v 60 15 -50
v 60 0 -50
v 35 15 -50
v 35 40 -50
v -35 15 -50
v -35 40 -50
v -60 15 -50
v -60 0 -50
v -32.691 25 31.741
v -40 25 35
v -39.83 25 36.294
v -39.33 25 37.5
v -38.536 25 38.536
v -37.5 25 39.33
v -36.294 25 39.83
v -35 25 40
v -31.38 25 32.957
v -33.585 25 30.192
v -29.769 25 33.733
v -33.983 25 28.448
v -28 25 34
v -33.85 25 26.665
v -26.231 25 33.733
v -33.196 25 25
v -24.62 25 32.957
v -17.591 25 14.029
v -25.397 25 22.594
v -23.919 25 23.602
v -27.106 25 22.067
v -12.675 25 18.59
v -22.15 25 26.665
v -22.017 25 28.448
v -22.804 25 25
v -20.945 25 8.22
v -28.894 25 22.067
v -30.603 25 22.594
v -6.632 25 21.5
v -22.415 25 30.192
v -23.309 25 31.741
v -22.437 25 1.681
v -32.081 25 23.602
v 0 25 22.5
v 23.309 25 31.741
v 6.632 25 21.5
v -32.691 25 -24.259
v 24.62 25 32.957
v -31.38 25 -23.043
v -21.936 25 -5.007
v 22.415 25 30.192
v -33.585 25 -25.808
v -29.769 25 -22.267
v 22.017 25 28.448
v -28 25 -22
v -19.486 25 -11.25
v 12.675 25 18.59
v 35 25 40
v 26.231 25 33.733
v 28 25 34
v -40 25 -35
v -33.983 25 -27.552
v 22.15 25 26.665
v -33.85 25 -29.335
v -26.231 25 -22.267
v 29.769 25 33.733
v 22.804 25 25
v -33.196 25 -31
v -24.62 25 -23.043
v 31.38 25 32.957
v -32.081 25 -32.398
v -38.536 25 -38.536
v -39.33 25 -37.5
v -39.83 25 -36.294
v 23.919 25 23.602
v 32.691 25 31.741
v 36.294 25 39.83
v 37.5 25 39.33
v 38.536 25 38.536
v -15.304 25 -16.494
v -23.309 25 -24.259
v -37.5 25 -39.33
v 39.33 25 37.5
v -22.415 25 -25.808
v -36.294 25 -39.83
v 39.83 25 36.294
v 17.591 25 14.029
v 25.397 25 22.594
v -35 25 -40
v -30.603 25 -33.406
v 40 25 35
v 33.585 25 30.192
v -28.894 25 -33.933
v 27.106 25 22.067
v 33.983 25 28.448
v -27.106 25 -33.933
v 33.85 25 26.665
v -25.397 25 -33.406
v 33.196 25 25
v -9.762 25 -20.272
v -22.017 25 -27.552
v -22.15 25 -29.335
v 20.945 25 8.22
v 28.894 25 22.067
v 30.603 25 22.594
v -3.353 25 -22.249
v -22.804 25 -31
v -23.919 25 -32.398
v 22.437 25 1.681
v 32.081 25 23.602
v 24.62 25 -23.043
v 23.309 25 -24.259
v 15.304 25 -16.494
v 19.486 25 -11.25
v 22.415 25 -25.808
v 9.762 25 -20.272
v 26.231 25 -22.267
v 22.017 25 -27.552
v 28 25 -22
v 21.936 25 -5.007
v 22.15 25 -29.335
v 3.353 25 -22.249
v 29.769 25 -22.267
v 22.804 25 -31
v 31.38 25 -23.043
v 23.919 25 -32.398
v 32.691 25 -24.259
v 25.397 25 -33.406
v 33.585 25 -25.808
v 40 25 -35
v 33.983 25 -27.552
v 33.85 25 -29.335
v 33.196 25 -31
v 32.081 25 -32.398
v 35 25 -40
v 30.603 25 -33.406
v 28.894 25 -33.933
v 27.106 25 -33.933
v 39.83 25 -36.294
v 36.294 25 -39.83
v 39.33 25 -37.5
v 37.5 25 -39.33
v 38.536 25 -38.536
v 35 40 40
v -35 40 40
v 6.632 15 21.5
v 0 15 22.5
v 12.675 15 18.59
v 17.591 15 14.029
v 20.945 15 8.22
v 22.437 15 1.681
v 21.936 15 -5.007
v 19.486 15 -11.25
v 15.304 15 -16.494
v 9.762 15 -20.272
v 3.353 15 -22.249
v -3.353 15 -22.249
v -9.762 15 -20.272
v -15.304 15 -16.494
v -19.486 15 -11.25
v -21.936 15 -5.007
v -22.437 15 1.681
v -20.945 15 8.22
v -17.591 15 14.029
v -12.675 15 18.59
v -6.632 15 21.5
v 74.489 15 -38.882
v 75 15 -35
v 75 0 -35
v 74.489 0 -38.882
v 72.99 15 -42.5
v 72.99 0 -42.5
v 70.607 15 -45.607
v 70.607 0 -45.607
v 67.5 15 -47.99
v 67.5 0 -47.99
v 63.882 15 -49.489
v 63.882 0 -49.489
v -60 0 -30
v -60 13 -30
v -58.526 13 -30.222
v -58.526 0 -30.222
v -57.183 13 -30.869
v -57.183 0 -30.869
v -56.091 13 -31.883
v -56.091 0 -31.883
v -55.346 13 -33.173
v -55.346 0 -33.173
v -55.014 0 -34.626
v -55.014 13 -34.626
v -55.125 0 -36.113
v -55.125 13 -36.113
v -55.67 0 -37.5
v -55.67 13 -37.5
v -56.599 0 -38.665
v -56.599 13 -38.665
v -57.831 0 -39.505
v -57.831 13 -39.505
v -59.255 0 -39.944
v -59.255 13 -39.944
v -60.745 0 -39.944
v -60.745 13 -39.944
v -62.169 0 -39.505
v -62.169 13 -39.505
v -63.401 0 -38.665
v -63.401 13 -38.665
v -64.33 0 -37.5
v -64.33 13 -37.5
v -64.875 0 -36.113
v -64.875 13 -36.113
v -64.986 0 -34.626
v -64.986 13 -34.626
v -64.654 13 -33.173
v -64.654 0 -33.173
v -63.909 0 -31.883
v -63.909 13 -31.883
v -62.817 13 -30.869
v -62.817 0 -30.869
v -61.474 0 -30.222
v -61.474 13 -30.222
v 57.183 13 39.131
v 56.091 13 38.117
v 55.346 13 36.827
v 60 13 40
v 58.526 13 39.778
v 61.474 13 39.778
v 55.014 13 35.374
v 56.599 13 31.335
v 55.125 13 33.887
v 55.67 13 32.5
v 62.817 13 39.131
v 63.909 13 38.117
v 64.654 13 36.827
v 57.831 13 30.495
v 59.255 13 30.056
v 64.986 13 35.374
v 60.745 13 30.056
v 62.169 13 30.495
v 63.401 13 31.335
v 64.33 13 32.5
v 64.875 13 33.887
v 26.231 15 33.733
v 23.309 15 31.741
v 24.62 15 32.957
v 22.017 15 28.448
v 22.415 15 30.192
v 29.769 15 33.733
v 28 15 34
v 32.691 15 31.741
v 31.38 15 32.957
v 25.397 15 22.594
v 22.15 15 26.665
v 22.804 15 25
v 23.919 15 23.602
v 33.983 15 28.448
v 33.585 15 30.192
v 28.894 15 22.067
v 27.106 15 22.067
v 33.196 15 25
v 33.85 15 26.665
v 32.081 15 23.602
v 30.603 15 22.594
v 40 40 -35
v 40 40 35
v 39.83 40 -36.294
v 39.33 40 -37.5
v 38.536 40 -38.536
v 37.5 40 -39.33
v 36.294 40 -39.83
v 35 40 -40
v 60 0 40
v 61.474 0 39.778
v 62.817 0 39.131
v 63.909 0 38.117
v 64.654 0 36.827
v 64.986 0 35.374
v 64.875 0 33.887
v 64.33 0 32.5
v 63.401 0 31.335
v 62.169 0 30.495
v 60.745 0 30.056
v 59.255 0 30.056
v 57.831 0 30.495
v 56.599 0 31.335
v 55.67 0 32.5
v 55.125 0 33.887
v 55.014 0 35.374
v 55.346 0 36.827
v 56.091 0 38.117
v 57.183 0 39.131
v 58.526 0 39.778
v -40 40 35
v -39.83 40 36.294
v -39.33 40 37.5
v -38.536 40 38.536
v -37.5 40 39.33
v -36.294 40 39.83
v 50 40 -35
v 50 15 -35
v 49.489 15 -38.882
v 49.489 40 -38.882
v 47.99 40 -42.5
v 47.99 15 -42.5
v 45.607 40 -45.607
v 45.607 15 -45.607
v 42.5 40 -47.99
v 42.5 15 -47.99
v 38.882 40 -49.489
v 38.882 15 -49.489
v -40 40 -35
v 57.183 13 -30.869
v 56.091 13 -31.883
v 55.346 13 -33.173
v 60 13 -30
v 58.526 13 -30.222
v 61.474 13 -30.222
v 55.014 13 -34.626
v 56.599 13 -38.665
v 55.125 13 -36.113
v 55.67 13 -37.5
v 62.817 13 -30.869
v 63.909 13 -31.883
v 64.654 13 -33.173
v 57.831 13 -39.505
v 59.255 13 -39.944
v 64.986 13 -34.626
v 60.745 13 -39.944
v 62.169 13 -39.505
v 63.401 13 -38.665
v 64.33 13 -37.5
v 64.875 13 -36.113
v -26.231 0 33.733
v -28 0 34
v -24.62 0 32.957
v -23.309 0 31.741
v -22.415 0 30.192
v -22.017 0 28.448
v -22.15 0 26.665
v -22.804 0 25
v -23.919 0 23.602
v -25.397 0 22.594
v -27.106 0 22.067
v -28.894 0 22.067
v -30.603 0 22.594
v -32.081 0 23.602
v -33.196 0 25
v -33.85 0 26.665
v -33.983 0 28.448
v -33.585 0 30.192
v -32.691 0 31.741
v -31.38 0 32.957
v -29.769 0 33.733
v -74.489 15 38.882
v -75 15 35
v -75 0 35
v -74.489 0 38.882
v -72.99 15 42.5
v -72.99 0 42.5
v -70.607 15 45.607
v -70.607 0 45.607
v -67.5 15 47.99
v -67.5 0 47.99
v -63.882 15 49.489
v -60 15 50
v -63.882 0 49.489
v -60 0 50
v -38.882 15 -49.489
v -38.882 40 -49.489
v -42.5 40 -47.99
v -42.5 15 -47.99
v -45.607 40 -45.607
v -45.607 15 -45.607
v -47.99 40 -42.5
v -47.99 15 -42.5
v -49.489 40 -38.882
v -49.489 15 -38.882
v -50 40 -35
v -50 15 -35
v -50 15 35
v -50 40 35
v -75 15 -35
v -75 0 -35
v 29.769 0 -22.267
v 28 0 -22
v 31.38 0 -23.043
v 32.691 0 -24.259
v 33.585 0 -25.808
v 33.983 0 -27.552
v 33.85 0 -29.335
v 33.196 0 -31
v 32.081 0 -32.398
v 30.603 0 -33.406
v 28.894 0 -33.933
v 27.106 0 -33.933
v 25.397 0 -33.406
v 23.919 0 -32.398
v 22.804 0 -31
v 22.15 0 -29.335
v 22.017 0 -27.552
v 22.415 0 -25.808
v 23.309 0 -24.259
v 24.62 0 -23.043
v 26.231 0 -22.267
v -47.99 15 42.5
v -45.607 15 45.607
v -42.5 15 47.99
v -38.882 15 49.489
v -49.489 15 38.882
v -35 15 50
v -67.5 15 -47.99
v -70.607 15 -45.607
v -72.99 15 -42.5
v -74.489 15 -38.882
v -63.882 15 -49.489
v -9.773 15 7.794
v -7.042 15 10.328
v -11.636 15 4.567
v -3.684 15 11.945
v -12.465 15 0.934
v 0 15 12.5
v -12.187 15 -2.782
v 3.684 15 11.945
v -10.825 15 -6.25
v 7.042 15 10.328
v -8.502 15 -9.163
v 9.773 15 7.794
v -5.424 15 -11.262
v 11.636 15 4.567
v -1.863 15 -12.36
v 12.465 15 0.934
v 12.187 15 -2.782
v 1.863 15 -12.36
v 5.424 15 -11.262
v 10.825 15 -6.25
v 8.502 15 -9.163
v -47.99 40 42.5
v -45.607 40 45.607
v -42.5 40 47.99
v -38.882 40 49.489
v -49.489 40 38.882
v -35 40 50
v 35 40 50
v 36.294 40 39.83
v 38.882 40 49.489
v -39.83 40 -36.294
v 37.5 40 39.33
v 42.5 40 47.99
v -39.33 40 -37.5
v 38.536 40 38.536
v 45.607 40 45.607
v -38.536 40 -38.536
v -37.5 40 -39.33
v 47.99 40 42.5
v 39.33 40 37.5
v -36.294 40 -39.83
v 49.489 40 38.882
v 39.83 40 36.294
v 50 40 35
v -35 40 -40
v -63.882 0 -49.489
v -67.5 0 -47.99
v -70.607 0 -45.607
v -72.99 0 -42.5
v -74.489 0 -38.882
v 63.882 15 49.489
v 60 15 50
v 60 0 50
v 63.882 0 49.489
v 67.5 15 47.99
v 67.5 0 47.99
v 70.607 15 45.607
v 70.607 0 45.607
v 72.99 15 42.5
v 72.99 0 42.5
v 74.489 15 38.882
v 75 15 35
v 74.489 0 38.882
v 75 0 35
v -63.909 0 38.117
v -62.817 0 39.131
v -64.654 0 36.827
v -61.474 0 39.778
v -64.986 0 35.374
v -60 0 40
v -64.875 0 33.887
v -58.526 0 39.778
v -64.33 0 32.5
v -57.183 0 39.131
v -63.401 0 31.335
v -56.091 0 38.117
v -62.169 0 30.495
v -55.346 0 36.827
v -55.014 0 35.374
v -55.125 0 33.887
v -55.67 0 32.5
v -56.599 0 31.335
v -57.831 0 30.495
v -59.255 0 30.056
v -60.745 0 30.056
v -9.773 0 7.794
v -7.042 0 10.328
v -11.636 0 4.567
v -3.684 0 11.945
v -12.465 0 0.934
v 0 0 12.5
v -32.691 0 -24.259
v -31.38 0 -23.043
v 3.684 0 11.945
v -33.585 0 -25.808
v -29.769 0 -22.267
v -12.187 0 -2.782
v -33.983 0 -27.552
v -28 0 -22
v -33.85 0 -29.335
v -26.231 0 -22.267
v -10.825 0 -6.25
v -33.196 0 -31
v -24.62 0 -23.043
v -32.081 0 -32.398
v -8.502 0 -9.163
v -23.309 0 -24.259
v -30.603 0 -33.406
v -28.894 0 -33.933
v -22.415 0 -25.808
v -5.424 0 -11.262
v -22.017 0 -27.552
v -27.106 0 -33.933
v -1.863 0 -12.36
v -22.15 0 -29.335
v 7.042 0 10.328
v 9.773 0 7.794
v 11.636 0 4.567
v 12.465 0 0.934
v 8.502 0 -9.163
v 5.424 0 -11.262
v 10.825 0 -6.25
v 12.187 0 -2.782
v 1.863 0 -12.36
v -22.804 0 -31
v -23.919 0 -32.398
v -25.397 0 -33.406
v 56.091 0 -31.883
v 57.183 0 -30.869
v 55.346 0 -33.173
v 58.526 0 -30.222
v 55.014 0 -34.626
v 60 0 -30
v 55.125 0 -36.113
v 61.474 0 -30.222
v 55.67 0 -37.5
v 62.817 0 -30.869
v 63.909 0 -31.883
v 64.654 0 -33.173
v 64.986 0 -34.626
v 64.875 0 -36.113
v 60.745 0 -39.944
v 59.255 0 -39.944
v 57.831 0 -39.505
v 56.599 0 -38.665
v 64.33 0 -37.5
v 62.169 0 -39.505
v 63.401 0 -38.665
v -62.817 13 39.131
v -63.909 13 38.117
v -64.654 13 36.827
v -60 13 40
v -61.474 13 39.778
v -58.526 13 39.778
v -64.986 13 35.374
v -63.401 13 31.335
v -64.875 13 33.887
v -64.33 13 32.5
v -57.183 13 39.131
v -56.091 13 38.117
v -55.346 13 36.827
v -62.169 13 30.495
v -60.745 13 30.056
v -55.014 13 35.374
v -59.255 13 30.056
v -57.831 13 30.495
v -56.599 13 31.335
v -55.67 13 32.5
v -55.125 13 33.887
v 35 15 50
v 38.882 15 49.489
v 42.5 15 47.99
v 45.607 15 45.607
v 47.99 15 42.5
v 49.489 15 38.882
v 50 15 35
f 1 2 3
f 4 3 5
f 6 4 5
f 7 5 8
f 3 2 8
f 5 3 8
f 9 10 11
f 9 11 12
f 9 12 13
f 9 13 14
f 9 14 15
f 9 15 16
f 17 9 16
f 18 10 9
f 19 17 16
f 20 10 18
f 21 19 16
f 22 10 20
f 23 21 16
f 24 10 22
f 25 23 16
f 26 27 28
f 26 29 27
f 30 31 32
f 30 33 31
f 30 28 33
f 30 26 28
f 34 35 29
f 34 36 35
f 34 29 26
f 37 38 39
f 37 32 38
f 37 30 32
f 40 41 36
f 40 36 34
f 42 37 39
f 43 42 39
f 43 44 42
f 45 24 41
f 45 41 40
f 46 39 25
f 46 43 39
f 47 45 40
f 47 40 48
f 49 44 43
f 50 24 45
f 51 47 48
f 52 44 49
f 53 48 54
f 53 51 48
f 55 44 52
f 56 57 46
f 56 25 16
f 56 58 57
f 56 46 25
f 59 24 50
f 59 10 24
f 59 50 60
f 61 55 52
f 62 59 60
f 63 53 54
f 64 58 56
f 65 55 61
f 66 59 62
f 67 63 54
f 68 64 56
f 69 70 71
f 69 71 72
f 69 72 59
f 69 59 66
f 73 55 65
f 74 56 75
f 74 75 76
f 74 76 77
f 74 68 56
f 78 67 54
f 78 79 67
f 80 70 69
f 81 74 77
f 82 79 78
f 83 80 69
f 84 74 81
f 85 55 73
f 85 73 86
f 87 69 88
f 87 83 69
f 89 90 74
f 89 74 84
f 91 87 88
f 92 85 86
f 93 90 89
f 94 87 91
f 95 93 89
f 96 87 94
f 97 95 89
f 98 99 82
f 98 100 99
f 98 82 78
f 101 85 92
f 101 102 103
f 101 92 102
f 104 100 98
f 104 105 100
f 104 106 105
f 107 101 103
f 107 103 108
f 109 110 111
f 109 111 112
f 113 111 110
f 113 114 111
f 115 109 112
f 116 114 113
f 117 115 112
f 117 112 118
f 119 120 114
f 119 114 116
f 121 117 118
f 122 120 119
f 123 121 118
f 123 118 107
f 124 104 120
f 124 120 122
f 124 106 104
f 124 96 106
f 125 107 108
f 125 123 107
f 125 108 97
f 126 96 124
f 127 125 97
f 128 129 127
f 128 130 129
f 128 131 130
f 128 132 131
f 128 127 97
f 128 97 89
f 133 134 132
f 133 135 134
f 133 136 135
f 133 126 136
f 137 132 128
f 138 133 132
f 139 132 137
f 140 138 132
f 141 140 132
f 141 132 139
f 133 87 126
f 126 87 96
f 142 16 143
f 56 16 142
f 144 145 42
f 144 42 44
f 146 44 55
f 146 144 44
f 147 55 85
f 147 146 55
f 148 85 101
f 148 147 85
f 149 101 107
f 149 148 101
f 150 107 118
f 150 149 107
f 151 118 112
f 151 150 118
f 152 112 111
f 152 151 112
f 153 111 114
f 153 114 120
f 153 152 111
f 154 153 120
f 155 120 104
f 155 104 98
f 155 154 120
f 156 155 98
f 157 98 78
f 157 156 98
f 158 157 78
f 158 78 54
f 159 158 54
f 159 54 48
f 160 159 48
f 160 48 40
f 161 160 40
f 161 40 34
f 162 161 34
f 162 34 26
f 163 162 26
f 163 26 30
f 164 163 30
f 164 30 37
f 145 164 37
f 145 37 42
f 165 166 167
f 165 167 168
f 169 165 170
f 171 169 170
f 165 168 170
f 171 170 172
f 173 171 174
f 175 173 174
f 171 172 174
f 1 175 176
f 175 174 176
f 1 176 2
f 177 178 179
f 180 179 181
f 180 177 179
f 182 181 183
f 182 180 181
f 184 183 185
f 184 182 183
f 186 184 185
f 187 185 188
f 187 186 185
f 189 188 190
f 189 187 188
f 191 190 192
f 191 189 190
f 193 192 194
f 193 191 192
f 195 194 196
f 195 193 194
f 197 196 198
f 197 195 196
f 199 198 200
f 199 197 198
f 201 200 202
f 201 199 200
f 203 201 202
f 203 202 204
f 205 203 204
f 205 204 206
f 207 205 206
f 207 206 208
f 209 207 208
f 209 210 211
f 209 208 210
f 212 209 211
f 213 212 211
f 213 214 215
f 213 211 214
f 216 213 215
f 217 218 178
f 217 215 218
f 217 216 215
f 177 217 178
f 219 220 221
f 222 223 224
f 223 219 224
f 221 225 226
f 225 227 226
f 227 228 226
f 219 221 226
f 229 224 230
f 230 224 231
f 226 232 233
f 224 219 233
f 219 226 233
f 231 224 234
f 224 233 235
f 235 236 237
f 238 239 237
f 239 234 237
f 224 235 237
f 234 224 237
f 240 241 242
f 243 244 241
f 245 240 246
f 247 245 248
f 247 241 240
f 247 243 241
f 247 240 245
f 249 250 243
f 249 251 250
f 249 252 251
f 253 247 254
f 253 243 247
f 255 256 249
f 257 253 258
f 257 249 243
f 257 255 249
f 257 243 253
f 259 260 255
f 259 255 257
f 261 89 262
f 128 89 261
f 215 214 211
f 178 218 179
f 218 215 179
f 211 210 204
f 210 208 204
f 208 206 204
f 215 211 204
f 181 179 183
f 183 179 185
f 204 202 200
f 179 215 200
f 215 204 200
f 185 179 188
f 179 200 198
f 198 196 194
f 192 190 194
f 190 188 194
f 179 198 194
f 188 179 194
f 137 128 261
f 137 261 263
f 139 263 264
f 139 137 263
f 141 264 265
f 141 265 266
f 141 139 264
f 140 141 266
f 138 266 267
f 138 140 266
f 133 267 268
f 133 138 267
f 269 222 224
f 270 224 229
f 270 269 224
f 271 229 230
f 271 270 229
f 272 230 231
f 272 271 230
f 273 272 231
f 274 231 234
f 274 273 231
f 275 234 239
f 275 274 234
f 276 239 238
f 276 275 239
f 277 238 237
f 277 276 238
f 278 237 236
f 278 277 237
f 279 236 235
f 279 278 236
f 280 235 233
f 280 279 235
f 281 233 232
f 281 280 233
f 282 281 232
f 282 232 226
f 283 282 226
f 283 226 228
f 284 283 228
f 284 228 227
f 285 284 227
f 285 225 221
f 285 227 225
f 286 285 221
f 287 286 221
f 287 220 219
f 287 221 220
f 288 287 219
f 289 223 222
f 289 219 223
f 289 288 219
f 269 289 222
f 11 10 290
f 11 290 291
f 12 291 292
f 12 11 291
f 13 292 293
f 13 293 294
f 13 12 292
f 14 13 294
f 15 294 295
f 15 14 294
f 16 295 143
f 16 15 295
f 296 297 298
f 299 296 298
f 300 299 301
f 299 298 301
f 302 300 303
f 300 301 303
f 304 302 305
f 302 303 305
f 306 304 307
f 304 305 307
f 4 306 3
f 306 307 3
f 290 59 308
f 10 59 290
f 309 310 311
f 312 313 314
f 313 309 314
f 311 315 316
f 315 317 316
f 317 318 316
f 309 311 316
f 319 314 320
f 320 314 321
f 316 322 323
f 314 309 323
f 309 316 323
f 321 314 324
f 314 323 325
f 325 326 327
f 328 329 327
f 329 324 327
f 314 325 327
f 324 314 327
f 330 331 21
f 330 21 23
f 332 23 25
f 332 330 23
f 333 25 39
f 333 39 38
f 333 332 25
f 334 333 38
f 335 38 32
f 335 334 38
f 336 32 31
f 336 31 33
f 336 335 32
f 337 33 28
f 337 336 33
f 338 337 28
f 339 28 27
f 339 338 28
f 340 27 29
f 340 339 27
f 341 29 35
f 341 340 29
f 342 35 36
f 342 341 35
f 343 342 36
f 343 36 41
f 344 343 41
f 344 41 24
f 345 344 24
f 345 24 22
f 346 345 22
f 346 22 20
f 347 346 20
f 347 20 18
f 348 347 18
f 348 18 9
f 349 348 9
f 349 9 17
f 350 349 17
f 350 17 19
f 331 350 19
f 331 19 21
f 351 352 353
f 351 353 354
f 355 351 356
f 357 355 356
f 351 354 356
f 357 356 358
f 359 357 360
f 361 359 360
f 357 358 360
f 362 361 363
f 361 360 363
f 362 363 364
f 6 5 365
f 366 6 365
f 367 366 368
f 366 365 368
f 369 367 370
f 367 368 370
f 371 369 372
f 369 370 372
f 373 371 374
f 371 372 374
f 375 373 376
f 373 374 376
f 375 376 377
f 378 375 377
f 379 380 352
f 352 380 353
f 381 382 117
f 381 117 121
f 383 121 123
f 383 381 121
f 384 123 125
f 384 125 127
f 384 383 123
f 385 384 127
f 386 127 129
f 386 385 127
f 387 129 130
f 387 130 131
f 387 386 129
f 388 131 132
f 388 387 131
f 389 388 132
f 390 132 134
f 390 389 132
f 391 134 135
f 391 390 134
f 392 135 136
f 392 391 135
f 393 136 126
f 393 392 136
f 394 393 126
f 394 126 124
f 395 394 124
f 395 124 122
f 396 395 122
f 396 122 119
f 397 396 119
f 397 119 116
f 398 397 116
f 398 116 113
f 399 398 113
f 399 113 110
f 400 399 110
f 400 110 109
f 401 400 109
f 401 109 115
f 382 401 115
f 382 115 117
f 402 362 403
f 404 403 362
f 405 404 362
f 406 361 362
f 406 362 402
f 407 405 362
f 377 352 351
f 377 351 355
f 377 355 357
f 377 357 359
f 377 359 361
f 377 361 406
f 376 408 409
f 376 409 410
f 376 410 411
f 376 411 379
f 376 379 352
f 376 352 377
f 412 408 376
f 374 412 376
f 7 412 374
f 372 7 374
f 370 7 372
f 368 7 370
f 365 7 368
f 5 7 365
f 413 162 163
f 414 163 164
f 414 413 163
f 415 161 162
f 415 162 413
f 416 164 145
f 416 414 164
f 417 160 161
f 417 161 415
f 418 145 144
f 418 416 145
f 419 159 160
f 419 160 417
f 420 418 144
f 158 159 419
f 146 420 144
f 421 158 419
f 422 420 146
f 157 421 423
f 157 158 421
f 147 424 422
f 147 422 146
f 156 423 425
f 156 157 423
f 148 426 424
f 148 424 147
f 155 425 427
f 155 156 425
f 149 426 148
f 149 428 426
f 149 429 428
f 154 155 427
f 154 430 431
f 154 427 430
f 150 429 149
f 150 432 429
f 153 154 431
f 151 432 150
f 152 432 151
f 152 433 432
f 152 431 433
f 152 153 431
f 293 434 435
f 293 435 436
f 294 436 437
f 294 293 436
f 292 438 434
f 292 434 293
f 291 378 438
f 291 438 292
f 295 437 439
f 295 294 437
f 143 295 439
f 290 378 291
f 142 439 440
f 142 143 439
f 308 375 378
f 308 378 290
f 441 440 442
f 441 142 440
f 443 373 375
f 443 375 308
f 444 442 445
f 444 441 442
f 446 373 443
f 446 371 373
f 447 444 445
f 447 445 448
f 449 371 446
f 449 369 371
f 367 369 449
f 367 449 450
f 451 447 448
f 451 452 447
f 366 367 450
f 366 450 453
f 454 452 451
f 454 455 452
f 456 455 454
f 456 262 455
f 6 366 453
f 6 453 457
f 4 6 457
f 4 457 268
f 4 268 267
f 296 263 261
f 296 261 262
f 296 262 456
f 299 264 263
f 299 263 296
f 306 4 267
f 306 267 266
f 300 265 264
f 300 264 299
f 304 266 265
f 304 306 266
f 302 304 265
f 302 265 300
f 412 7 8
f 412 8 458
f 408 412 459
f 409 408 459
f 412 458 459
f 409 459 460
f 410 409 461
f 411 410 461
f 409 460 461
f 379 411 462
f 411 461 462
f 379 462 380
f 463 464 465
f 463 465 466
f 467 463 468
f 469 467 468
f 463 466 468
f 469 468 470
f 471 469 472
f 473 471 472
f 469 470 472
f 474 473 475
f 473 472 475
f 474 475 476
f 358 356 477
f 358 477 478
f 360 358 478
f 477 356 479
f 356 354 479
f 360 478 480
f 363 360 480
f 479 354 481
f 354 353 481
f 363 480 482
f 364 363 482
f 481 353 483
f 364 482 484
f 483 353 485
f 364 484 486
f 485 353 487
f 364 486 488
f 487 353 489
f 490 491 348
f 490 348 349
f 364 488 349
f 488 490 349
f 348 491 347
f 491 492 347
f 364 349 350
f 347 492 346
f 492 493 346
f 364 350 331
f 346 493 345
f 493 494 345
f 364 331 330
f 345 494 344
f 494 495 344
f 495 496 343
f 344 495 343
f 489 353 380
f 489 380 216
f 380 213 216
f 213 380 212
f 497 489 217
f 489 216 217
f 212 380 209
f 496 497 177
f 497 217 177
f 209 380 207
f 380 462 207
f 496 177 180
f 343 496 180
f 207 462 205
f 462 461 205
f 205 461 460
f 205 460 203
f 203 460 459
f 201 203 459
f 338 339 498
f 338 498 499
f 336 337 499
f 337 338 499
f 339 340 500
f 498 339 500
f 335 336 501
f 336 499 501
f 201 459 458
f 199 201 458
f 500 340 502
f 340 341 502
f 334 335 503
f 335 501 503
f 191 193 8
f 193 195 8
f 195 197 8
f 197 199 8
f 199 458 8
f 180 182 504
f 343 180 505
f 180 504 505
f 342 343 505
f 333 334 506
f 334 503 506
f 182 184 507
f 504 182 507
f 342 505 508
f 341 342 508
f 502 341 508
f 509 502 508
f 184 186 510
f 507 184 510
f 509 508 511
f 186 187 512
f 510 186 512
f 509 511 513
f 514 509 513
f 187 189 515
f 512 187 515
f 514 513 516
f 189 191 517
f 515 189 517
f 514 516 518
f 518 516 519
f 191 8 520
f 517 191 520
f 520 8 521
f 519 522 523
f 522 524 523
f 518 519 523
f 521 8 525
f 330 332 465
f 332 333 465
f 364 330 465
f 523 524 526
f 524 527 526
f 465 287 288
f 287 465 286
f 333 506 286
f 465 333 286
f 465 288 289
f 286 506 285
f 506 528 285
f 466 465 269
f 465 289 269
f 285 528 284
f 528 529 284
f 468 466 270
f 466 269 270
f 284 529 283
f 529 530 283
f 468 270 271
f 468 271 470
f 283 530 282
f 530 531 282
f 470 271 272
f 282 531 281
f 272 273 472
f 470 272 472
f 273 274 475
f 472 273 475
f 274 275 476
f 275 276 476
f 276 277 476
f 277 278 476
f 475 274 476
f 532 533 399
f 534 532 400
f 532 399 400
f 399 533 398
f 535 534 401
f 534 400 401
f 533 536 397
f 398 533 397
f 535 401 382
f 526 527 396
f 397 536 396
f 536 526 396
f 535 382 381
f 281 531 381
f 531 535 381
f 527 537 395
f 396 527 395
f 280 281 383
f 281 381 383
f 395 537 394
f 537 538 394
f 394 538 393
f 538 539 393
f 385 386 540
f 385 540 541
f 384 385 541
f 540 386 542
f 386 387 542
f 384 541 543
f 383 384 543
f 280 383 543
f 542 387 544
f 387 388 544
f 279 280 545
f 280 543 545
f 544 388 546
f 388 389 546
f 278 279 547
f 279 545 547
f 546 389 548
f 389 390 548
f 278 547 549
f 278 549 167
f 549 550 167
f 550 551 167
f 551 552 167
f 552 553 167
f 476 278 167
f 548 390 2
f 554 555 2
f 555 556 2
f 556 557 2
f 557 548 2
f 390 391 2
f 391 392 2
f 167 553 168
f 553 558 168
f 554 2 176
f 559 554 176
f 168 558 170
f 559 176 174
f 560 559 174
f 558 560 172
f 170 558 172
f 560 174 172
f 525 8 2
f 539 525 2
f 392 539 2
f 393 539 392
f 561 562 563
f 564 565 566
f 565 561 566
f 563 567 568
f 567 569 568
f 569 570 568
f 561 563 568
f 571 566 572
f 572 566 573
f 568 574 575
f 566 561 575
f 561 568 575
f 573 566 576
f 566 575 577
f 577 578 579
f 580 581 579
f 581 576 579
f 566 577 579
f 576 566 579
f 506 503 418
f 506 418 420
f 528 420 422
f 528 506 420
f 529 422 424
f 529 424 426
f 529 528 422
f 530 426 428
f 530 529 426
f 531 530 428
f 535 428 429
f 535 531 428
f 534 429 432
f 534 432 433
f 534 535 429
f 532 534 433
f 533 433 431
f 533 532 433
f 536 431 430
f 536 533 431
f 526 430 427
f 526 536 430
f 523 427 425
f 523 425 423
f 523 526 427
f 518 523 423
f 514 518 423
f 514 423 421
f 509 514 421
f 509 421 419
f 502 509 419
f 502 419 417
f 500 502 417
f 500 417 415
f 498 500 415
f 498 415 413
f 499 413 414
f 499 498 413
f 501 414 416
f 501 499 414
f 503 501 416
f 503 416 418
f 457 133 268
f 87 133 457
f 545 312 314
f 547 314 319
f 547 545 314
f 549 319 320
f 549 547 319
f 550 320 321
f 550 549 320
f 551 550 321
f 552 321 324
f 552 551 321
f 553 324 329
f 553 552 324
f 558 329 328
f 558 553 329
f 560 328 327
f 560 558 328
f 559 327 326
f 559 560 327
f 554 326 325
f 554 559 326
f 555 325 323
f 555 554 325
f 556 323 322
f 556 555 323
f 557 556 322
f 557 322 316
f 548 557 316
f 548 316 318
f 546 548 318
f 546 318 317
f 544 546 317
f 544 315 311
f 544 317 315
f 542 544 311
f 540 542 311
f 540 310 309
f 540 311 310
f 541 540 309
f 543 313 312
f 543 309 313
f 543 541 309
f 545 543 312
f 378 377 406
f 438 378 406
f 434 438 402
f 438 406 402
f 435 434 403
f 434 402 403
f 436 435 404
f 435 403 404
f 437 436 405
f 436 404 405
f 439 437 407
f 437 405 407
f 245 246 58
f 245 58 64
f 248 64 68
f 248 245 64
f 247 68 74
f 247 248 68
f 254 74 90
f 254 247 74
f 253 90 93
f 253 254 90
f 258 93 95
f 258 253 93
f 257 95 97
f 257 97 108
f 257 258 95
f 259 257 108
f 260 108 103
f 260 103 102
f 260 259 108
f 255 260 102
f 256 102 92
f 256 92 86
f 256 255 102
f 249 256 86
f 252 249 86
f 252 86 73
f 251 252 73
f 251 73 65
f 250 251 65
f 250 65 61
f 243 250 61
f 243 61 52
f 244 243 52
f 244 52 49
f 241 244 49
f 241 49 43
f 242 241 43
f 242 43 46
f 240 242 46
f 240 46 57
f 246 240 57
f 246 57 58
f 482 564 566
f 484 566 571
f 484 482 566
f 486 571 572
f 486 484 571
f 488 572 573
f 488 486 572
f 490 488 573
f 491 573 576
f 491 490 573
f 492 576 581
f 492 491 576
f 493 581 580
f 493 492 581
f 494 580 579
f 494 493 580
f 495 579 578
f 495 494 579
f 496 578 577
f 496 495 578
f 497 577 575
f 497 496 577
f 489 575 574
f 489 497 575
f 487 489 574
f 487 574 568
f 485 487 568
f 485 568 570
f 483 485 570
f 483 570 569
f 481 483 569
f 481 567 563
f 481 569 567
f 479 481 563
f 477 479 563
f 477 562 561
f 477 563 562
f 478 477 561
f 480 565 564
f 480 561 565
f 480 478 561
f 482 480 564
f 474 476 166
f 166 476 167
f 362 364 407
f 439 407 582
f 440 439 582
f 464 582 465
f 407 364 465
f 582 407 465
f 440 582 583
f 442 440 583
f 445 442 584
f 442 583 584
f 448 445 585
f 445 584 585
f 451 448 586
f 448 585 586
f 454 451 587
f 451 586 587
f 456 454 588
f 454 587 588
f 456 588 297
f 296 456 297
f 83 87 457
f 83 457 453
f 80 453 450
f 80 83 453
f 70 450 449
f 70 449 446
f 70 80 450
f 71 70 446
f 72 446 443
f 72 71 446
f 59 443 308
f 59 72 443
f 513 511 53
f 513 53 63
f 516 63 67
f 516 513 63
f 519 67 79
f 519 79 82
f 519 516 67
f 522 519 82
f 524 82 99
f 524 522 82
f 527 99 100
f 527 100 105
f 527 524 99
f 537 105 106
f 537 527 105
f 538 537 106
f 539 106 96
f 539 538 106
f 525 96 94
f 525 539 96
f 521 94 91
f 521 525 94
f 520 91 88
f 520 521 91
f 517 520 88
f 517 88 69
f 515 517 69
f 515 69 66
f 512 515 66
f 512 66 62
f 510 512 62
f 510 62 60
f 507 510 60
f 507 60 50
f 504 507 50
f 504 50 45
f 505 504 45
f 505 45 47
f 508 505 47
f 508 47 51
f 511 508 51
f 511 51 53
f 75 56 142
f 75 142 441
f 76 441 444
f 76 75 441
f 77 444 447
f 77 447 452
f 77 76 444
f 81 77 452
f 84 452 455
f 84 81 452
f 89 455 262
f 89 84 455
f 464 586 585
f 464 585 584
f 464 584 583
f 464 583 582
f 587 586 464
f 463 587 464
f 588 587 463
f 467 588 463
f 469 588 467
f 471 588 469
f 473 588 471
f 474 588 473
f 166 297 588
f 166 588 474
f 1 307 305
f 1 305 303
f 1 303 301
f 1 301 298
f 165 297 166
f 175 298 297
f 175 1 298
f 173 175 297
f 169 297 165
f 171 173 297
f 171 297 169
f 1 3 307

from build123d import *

# Parameters (mm, degrees)
CROQUIS3_R              = 12.5
CROQUIS3_R_2            = 6
CROQUIS3_R_3            = 5
SALIENTE_EXTRUIR1_DEPTH = 15
SALIENTE_EXTRUIR2_START = 15
CROQUIS4_R              = 7.5
SALIENTE_EXTRUIR2_DEPTH = 2
SALIENTE_EXTRUIR3_DEPTH = 40
CROQUIS6_R              = 22.5
CROQUIS6_R_2            = 6
SALIENTE_EXTRUIR4_DEPTH = 25


with BuildPart() as part:
    # Croquis3 → Saliente-Extruir1 (new body)
    with BuildSketch(Plane(origin=(0, 0, 0), x_dir=(1, 0, 0), z_dir=(0, 1, 0))):
        with BuildLine():
            Line((60, 50), (-60, 50))
            ThreePointArc((-60, 50), (-70.606601718, 45.606601718), (-75, 35))
            Line((-75, 35), (-75, -35))
            ThreePointArc((-75, -35), (-70.606601718, -45.606601718), (-60, -50))
            Line((-60, -50), (60, -50))
            ThreePointArc((60, -50), (70.606601718, -45.606601718), (75, -35))
            Line((75, -35), (75, 35))
            ThreePointArc((75, 35), (70.606601718, 45.606601718), (60, 50))
        make_face()
        with Locations(Location((0, 0, 0), (0, 0, 270))):
            Circle(CROQUIS3_R, mode=Mode.SUBTRACT)
        with Locations(Location((-28, -28, 0), (0, 0, 270))):
            Circle(CROQUIS3_R_2, mode=Mode.SUBTRACT)
        with Locations(Location((-28, 28, 0), (0, 0, 270))):
            Circle(CROQUIS3_R_2, mode=Mode.SUBTRACT)
        with Locations(Location((28, 28, 0), (0, 0, 270))):
            Circle(CROQUIS3_R_2, mode=Mode.SUBTRACT)
        with Locations(Location((60, 35, 0), (0, 0, 270))):
            Circle(CROQUIS3_R_3, mode=Mode.SUBTRACT)
        with Locations(Location((60, -35, 0), (0, 0, 270))):
            Circle(CROQUIS3_R_3, mode=Mode.SUBTRACT)
        with Locations(Location((-60, -35, 0), (0, 0, 270))):
            Circle(CROQUIS3_R_3, mode=Mode.SUBTRACT)
        with Locations(Location((-60, 35, 0), (0, 0, 270))):
            Circle(CROQUIS3_R_3, mode=Mode.SUBTRACT)
    extrude(amount=SALIENTE_EXTRUIR1_DEPTH)

    # Croquis4 → Saliente-Extruir2 (add)
    with BuildSketch(Plane(origin=(0, 0, 0), x_dir=(1, 0, 0), z_dir=(0, 1, 0)).offset(SALIENTE_EXTRUIR2_START)):
        with Locations((60, -35)):
            Circle(CROQUIS4_R)
        with Locations((60, 35)):
            Circle(CROQUIS4_R)
        with Locations((-60, 35)):
            Circle(CROQUIS4_R)
        with Locations((-60, -35)):
            Circle(CROQUIS4_R)
    extrude(amount=-SALIENTE_EXTRUIR2_DEPTH)

    # Croquis5 → Saliente-Extruir3 (add)
    with BuildSketch(Plane(origin=(0, 0, 0), x_dir=(1, 0, 0), z_dir=(0, 1, 0))):
        with BuildLine():
            Line((50, -35), (50, 35))
            ThreePointArc((50, 35), (45.606601718, 45.606601718), (35, 50))
            Line((35, 50), (-35, 50))
            ThreePointArc((-35, 50), (-45.606601718, 45.606601718), (-50, 35))
            Line((-50, 35), (-50, -35))
            ThreePointArc((-50, -35), (-45.606601718, -45.606601718), (-35, -50))
            Line((-35, -50), (35, -50))
            ThreePointArc((35, -50), (45.606601718, -45.606601718), (50, -35))
        make_face()
        with BuildLine():
            Line((35, 40), (-35, 40))
            ThreePointArc((-35, 40), (-38.535533906, 38.535533906), (-40, 35))
            Line((-40, 35), (-40, -35))
            ThreePointArc((-40, -35), (-38.535533906, -38.535533906), (-35, -40))
            Line((-35, -40), (35, -40))
            ThreePointArc((35, -40), (38.535533906, -38.535533906), (40, -35))
            Line((40, -35), (40, 35))
            ThreePointArc((40, 35), (38.535533906, 38.535533906), (35, 40))
        make_face(mode=Mode.SUBTRACT)
    extrude(amount=SALIENTE_EXTRUIR3_DEPTH)

    # Croquis6 → Saliente-Extruir4 (add)
    with BuildSketch(Plane(origin=(0, 0, 0), x_dir=(1, 0, 0), z_dir=(0, 1, 0))):
        with BuildLine():
            Line((-35, -40), (35, -40))
            ThreePointArc((35, -40), (38.535533906, -38.535533906), (40, -35))
            Line((40, -35), (40, 35))
            ThreePointArc((40, 35), (38.535533906, 38.535533906), (35, 40))
            Line((35, 40), (-35, 40))
            ThreePointArc((-35, 40), (-38.535533906, 38.535533906), (-40, 35))
            Line((-40, 35), (-40, -35))
            ThreePointArc((-40, -35), (-38.535533906, -38.535533906), (-35, -40))
        make_face()
        with Locations(Location((0, 0, 0), (0, 0, 270))):
            Circle(CROQUIS6_R, mode=Mode.SUBTRACT)
        with Locations(Location((28, 28, 0), (0, 0, 270))):
            Circle(CROQUIS6_R_2, mode=Mode.SUBTRACT)
        with Locations(Location((28, -28, 0), (0, 0, 270))):
            Circle(CROQUIS6_R_2, mode=Mode.SUBTRACT)
        with Locations(Location((-28, -28, 0), (0, 0, 270))):
            Circle(CROQUIS6_R_2, mode=Mode.SUBTRACT)
        with Locations(Location((-28, 28, 0), (0, 0, 270))):
            Circle(CROQUIS6_R_2, mode=Mode.SUBTRACT)
    extrude(amount=SALIENTE_EXTRUIR4_DEPTH)


solid = part.part
